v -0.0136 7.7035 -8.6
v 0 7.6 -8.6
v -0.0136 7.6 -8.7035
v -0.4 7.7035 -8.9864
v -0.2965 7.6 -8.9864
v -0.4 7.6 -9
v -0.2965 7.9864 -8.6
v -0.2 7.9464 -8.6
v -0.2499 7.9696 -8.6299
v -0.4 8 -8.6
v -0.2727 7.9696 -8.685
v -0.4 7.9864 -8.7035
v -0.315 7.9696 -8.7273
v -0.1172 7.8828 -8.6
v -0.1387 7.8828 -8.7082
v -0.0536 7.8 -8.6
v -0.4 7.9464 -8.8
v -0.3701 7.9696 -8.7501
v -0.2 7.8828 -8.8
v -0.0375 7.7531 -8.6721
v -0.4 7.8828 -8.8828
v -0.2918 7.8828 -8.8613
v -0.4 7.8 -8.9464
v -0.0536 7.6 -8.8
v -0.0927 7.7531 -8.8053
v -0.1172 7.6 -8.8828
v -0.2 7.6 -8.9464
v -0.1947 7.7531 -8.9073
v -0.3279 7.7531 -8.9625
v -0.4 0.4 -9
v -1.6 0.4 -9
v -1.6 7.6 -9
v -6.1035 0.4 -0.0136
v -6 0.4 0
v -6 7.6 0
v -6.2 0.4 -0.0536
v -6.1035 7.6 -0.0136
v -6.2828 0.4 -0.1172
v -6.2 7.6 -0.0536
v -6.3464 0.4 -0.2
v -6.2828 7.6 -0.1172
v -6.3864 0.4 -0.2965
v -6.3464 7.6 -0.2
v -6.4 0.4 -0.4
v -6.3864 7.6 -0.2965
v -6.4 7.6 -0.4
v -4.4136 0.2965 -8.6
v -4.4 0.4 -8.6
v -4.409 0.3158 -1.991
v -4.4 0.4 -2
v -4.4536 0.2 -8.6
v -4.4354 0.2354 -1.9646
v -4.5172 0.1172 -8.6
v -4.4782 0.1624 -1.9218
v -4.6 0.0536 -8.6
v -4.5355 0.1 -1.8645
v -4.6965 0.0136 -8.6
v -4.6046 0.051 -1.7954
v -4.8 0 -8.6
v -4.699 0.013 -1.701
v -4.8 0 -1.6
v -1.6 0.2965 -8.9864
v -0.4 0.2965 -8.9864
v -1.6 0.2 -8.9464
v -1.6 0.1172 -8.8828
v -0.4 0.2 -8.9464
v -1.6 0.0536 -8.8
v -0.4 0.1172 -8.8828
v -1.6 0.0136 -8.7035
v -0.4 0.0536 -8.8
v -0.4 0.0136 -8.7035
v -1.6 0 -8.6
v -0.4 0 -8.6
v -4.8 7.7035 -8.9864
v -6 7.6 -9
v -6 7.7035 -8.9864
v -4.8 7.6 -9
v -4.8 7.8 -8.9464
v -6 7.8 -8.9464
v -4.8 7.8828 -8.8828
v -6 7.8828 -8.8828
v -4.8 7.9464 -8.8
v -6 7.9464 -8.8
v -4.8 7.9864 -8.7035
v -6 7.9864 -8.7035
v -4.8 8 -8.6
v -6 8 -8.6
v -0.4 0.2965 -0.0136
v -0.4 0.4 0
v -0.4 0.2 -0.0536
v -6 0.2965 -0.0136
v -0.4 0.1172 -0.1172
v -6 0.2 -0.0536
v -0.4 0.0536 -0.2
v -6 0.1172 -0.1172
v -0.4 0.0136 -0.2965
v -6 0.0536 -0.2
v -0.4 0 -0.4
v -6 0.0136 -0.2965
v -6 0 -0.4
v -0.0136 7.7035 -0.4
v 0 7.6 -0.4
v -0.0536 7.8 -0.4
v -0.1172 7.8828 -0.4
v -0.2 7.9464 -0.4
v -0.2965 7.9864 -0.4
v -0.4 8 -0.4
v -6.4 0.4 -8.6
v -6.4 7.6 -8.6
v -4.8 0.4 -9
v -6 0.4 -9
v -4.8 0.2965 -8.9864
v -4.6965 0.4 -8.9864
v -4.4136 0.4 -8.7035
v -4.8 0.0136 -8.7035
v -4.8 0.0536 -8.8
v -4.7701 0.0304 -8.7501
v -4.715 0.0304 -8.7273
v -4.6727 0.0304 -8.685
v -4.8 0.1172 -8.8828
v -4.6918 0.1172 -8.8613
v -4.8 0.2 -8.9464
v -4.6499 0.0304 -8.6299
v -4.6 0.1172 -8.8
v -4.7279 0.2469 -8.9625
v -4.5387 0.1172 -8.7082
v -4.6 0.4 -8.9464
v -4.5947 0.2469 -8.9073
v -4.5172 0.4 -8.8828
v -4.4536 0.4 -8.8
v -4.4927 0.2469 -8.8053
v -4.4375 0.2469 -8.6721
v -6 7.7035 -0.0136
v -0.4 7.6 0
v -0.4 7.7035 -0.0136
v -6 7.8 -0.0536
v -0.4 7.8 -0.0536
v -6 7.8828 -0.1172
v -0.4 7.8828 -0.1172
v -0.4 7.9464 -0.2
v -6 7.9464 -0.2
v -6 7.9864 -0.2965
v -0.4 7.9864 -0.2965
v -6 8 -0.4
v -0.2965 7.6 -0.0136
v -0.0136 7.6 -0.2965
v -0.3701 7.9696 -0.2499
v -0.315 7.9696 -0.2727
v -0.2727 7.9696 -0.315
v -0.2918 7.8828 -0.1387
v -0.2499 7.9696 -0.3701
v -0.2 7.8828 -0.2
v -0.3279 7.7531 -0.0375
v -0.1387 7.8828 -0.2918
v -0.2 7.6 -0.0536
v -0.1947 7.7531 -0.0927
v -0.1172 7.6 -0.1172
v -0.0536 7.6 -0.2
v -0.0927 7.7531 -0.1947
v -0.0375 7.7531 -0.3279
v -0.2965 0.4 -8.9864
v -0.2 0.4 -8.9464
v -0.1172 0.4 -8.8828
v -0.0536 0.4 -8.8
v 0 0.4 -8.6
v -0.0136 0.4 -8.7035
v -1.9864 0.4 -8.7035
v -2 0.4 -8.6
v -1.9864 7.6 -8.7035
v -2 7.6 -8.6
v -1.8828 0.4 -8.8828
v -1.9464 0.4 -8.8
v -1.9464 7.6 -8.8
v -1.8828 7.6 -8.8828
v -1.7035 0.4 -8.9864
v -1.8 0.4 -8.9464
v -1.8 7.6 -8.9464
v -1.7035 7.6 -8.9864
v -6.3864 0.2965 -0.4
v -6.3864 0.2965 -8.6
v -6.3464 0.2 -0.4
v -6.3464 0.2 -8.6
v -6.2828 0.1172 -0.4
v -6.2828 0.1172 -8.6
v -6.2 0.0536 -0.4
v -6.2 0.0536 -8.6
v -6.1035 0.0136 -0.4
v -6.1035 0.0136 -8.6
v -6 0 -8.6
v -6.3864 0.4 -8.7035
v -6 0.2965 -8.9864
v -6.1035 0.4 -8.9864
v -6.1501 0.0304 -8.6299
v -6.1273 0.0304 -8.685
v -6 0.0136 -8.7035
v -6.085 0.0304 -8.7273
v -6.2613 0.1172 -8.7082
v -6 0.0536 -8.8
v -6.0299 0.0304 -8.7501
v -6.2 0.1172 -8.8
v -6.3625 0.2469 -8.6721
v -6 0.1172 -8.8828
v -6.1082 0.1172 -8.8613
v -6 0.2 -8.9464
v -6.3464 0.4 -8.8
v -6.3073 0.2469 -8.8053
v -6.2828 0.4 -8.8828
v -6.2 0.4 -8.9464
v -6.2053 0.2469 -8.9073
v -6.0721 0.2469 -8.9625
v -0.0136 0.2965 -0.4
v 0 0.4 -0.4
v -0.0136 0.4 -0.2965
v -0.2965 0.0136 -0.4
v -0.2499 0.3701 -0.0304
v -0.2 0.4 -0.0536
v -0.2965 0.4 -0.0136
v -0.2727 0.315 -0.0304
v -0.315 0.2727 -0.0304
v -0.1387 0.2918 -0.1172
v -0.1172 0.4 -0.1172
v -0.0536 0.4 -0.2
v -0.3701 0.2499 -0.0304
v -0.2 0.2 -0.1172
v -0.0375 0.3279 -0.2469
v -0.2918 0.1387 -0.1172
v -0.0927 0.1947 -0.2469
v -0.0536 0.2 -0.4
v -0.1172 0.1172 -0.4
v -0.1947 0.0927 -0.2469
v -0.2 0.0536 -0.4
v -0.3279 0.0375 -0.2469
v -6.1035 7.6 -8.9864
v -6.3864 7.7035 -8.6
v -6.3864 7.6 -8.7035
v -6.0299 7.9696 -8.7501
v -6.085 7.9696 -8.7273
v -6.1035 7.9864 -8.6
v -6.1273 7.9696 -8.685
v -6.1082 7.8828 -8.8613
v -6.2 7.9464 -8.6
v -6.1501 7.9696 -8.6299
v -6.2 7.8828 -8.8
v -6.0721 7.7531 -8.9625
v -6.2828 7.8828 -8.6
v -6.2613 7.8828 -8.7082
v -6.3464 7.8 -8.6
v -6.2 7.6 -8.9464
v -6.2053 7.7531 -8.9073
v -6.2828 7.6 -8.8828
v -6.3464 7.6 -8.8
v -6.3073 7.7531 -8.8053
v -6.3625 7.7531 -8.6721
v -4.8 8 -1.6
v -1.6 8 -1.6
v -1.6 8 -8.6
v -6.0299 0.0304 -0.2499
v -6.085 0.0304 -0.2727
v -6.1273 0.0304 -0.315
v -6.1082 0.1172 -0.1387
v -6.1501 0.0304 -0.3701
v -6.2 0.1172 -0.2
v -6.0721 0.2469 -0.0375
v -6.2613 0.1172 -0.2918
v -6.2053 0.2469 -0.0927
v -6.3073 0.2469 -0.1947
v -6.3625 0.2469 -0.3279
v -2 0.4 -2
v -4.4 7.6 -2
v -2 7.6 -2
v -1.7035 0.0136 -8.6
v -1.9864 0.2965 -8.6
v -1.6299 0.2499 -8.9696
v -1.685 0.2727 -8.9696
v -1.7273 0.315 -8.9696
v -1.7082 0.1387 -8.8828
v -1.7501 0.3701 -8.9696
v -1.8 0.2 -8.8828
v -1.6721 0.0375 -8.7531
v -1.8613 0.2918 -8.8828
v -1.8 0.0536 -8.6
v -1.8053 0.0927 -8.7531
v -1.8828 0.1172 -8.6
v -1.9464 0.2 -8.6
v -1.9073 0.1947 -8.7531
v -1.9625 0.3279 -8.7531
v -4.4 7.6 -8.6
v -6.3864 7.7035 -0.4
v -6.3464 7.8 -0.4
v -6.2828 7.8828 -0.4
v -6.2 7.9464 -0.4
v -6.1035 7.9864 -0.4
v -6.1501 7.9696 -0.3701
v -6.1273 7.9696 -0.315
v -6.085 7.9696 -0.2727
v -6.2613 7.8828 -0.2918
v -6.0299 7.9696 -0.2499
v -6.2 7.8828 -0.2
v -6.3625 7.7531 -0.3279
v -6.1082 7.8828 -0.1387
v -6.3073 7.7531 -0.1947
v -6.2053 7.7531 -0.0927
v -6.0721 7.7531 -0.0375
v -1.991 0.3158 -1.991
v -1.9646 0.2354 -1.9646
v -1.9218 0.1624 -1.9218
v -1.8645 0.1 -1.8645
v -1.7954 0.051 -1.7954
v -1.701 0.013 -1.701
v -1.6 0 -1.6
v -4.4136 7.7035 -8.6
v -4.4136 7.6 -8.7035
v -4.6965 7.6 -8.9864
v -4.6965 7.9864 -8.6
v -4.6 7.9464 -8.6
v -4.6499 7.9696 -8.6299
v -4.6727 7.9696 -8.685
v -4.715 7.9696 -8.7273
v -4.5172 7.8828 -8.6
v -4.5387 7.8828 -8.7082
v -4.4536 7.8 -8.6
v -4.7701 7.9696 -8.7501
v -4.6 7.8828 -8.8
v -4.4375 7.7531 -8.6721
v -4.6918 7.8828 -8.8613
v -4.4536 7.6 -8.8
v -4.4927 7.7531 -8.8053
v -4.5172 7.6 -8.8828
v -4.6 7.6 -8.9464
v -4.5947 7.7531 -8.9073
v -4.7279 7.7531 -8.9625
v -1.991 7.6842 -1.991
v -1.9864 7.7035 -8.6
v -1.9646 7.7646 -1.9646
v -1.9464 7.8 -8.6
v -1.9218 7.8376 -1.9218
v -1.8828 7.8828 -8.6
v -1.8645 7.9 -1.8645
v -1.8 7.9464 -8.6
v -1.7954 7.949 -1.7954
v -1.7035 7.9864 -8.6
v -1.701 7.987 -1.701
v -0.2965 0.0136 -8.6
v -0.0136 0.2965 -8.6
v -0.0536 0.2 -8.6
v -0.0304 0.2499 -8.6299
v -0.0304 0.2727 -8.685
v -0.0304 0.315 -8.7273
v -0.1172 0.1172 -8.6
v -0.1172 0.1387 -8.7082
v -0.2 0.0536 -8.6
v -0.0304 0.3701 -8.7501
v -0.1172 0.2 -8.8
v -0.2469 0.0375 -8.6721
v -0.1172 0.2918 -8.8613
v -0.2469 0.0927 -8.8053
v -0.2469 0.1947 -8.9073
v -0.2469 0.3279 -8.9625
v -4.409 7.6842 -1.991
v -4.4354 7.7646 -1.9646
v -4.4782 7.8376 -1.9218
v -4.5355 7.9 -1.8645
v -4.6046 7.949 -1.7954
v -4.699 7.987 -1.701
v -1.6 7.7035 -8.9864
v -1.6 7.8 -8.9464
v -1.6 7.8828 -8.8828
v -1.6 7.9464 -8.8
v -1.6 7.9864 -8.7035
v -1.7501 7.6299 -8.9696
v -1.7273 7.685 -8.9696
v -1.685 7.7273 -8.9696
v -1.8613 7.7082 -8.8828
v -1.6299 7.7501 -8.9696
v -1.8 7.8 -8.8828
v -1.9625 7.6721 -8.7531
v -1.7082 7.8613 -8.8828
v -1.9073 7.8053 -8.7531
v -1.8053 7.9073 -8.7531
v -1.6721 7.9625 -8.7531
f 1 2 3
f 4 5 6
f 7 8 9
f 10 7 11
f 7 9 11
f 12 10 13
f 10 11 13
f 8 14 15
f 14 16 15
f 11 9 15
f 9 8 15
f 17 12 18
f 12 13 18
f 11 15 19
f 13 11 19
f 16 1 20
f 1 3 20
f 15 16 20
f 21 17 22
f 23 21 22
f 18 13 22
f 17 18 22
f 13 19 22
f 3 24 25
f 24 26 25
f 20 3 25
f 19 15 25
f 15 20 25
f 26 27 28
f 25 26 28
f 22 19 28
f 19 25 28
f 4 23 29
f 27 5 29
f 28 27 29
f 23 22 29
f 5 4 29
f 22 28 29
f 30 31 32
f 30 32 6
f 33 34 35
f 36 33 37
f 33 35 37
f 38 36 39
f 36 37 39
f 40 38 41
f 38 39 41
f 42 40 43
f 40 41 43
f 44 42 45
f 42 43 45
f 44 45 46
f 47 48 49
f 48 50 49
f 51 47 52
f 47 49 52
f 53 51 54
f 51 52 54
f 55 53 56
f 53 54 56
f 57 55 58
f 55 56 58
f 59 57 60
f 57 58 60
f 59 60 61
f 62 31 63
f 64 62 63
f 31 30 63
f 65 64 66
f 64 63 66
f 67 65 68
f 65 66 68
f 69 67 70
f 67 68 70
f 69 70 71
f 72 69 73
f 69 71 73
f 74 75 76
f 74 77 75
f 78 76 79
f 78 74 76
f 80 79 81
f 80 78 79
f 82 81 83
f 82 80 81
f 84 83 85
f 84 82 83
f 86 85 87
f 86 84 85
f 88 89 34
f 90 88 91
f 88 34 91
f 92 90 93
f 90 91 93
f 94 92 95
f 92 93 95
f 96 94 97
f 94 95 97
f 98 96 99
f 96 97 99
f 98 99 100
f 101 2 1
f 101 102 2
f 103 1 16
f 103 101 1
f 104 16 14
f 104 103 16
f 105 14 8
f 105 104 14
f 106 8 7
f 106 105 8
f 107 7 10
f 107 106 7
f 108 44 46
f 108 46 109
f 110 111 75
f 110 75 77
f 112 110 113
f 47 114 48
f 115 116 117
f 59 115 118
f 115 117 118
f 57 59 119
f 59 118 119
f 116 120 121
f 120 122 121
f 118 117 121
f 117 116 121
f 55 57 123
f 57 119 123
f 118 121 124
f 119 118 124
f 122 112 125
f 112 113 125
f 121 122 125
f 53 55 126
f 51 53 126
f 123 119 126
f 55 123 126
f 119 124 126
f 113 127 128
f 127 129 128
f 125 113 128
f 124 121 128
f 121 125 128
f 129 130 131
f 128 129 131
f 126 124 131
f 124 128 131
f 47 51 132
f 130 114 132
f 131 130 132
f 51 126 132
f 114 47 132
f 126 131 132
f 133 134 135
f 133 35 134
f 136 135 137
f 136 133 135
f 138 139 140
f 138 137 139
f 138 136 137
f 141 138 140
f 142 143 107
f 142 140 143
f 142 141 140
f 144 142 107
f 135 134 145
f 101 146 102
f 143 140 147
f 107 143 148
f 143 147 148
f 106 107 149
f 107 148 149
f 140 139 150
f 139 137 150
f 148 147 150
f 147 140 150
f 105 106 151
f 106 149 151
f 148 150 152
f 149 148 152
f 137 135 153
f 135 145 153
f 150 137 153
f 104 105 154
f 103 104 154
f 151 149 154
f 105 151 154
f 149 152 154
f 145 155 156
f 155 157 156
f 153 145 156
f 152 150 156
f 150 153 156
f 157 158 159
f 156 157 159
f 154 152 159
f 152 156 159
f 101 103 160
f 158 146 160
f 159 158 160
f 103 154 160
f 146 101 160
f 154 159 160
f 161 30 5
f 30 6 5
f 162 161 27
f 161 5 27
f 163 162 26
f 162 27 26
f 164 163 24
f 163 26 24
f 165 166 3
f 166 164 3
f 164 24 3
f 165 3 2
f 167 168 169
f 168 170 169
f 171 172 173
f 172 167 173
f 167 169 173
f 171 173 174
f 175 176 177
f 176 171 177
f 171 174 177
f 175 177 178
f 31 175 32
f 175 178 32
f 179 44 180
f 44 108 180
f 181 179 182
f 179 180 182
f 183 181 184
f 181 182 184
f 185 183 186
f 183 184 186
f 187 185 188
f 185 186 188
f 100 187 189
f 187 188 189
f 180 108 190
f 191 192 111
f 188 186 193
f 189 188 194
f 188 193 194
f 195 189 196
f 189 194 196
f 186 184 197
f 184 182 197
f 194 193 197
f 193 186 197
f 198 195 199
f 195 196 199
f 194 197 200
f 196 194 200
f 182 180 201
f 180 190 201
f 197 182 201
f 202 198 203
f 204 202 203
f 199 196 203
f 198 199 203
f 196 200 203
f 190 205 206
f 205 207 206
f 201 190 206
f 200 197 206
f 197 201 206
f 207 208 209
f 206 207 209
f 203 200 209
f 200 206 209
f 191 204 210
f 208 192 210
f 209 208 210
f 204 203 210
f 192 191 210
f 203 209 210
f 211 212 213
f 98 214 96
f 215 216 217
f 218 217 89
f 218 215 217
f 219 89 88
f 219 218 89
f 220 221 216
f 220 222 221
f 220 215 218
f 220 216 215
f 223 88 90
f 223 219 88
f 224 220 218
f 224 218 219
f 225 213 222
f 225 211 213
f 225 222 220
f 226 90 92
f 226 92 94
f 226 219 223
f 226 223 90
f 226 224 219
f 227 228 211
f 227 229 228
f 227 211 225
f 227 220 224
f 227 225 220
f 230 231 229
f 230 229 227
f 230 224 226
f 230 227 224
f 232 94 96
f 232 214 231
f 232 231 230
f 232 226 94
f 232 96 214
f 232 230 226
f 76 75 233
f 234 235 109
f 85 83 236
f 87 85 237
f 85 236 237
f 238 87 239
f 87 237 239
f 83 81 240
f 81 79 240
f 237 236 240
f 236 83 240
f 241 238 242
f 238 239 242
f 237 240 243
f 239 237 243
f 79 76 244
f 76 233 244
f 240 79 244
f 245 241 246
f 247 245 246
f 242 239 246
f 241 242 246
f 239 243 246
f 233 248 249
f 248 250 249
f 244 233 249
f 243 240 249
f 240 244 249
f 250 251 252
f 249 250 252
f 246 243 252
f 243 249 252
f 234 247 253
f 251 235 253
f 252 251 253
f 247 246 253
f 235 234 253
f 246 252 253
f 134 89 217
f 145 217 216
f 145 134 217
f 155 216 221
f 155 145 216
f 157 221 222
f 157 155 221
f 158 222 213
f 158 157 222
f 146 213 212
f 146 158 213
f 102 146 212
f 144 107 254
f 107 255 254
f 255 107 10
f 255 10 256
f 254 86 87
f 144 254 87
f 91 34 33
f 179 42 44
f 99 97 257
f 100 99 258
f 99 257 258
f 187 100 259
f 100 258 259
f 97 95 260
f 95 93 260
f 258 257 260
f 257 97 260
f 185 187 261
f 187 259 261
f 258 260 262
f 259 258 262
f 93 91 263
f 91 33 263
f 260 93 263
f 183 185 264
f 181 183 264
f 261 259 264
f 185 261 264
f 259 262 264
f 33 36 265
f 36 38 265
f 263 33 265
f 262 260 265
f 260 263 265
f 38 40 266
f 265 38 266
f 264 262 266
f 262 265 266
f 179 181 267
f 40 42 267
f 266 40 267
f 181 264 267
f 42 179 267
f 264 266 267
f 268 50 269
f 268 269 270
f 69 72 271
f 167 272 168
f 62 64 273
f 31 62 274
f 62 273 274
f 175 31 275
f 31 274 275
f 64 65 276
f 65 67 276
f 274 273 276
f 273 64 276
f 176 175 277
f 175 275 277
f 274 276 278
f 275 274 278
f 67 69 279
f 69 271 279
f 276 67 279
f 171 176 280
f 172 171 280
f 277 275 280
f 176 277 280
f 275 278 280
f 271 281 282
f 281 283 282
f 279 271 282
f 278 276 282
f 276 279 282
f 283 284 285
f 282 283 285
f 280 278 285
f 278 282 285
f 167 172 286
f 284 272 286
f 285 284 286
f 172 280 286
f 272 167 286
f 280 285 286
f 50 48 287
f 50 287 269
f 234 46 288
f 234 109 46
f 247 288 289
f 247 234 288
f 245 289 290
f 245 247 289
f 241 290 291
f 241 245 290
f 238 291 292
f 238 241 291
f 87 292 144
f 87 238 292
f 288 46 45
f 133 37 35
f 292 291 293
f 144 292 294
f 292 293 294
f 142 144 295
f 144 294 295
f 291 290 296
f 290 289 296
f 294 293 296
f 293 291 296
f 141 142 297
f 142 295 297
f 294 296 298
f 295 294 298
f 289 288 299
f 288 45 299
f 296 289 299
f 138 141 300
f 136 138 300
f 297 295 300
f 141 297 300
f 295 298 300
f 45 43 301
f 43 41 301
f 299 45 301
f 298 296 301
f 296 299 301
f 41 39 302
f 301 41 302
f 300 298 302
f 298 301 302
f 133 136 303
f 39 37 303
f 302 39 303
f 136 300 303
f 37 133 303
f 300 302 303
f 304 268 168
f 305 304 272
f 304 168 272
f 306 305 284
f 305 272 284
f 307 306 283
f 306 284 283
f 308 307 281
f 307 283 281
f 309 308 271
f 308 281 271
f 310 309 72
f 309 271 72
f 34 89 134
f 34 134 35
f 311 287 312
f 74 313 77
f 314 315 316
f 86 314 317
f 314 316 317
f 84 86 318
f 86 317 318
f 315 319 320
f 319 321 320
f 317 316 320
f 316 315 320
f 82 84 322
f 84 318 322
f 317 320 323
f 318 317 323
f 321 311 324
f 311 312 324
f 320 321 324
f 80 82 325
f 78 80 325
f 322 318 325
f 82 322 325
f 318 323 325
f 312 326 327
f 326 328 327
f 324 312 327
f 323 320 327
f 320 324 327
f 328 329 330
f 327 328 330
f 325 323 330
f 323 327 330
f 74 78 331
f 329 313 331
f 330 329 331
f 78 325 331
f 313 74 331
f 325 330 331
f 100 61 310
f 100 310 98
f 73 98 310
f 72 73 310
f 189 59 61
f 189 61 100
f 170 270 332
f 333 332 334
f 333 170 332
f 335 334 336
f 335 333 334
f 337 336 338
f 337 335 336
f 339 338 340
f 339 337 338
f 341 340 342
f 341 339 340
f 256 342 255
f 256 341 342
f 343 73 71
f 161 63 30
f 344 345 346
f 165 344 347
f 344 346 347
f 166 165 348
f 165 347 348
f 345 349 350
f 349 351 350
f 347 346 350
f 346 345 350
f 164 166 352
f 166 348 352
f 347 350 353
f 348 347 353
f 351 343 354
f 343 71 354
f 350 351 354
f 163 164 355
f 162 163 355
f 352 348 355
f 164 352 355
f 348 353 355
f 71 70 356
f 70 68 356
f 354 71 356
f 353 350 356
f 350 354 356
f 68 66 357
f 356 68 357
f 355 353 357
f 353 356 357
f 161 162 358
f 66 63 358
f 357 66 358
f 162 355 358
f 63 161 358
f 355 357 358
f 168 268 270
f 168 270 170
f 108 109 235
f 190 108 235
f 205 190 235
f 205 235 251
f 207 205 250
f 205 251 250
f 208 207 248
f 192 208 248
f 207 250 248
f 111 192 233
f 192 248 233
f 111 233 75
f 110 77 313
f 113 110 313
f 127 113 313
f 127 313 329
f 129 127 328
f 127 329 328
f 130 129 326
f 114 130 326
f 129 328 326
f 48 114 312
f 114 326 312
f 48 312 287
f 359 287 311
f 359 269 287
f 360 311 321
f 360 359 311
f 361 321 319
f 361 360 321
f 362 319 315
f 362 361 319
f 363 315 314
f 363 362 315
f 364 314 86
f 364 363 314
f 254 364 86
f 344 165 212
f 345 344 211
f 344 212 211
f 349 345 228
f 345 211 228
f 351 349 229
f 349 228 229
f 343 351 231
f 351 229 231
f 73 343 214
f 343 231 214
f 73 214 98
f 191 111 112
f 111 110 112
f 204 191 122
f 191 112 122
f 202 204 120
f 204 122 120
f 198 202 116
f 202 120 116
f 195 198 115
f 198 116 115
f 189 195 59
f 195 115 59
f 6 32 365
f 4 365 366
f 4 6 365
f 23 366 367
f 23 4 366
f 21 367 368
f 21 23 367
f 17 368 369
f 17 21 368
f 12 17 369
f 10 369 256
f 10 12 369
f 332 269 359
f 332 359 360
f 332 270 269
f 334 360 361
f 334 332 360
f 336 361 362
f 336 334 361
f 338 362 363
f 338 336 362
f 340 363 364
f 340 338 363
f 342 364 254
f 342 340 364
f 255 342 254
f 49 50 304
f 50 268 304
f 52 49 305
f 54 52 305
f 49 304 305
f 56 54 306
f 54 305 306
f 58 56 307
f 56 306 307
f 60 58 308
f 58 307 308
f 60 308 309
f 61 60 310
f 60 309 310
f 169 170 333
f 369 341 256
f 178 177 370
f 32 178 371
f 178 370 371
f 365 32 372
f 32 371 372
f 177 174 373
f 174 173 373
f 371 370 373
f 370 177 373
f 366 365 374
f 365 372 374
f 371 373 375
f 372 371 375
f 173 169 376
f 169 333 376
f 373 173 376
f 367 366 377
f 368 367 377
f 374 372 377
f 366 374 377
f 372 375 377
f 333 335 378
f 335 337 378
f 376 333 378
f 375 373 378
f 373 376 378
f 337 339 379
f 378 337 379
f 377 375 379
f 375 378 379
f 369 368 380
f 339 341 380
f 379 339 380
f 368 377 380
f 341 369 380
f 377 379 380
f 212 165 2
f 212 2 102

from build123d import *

# Parameters (mm, degrees)
BOSS_EXTRUDE1_DEPTH = 8
FILLET1_R           = 0.4


with BuildPart() as part:
    # Sketch1 → Boss-Extrude1 (new body)
    with BuildSketch(Plane(origin=(0, 0, 0), x_dir=(1, 0, 0), z_dir=(0, 1, 0))):
        Polygon((0, 0), (-6.4, 0), (-6.4, 9), (-4.4, 9), (-4.4, 2), (-2, 2), (-2, 9), (0, 9), align=None)
    extrude(amount=BOSS_EXTRUDE1_DEPTH)

    # Fillet1
    fillet1_edges = [part.edges().sort_by_distance(p)[0] for p in [
        (-3.2, 0, -2),
        (-2, 0, -5.5),
        (-1, 0, -9),
        (0, 0, -4.5),
        (-2, 8, -5.5),
        (0, 4, 0),
        (-6.4, 4, 0),
        (-6.4, 4, -9),
        (-4.4, 4, -9),
        (-2, 4, -9),
        (0, 4, -9),
        (-3.2, 8, -2),
        (-4.4, 8, -5.5),
        (-5.4, 8, -9),
        (-6.4, 8, -4.5),
        (-3.2, 8, 0),
        (0, 8, -4.5),
        (-3.2, 0, 0),
        (-1, 8, -9),
        (-6.4, 0, -4.5),
        (-5.4, 0, -9),
        (-4.4, 0, -5.5),
    ]]
    fillet(fillet1_edges, radius=FILLET1_R)


solid = part.part
